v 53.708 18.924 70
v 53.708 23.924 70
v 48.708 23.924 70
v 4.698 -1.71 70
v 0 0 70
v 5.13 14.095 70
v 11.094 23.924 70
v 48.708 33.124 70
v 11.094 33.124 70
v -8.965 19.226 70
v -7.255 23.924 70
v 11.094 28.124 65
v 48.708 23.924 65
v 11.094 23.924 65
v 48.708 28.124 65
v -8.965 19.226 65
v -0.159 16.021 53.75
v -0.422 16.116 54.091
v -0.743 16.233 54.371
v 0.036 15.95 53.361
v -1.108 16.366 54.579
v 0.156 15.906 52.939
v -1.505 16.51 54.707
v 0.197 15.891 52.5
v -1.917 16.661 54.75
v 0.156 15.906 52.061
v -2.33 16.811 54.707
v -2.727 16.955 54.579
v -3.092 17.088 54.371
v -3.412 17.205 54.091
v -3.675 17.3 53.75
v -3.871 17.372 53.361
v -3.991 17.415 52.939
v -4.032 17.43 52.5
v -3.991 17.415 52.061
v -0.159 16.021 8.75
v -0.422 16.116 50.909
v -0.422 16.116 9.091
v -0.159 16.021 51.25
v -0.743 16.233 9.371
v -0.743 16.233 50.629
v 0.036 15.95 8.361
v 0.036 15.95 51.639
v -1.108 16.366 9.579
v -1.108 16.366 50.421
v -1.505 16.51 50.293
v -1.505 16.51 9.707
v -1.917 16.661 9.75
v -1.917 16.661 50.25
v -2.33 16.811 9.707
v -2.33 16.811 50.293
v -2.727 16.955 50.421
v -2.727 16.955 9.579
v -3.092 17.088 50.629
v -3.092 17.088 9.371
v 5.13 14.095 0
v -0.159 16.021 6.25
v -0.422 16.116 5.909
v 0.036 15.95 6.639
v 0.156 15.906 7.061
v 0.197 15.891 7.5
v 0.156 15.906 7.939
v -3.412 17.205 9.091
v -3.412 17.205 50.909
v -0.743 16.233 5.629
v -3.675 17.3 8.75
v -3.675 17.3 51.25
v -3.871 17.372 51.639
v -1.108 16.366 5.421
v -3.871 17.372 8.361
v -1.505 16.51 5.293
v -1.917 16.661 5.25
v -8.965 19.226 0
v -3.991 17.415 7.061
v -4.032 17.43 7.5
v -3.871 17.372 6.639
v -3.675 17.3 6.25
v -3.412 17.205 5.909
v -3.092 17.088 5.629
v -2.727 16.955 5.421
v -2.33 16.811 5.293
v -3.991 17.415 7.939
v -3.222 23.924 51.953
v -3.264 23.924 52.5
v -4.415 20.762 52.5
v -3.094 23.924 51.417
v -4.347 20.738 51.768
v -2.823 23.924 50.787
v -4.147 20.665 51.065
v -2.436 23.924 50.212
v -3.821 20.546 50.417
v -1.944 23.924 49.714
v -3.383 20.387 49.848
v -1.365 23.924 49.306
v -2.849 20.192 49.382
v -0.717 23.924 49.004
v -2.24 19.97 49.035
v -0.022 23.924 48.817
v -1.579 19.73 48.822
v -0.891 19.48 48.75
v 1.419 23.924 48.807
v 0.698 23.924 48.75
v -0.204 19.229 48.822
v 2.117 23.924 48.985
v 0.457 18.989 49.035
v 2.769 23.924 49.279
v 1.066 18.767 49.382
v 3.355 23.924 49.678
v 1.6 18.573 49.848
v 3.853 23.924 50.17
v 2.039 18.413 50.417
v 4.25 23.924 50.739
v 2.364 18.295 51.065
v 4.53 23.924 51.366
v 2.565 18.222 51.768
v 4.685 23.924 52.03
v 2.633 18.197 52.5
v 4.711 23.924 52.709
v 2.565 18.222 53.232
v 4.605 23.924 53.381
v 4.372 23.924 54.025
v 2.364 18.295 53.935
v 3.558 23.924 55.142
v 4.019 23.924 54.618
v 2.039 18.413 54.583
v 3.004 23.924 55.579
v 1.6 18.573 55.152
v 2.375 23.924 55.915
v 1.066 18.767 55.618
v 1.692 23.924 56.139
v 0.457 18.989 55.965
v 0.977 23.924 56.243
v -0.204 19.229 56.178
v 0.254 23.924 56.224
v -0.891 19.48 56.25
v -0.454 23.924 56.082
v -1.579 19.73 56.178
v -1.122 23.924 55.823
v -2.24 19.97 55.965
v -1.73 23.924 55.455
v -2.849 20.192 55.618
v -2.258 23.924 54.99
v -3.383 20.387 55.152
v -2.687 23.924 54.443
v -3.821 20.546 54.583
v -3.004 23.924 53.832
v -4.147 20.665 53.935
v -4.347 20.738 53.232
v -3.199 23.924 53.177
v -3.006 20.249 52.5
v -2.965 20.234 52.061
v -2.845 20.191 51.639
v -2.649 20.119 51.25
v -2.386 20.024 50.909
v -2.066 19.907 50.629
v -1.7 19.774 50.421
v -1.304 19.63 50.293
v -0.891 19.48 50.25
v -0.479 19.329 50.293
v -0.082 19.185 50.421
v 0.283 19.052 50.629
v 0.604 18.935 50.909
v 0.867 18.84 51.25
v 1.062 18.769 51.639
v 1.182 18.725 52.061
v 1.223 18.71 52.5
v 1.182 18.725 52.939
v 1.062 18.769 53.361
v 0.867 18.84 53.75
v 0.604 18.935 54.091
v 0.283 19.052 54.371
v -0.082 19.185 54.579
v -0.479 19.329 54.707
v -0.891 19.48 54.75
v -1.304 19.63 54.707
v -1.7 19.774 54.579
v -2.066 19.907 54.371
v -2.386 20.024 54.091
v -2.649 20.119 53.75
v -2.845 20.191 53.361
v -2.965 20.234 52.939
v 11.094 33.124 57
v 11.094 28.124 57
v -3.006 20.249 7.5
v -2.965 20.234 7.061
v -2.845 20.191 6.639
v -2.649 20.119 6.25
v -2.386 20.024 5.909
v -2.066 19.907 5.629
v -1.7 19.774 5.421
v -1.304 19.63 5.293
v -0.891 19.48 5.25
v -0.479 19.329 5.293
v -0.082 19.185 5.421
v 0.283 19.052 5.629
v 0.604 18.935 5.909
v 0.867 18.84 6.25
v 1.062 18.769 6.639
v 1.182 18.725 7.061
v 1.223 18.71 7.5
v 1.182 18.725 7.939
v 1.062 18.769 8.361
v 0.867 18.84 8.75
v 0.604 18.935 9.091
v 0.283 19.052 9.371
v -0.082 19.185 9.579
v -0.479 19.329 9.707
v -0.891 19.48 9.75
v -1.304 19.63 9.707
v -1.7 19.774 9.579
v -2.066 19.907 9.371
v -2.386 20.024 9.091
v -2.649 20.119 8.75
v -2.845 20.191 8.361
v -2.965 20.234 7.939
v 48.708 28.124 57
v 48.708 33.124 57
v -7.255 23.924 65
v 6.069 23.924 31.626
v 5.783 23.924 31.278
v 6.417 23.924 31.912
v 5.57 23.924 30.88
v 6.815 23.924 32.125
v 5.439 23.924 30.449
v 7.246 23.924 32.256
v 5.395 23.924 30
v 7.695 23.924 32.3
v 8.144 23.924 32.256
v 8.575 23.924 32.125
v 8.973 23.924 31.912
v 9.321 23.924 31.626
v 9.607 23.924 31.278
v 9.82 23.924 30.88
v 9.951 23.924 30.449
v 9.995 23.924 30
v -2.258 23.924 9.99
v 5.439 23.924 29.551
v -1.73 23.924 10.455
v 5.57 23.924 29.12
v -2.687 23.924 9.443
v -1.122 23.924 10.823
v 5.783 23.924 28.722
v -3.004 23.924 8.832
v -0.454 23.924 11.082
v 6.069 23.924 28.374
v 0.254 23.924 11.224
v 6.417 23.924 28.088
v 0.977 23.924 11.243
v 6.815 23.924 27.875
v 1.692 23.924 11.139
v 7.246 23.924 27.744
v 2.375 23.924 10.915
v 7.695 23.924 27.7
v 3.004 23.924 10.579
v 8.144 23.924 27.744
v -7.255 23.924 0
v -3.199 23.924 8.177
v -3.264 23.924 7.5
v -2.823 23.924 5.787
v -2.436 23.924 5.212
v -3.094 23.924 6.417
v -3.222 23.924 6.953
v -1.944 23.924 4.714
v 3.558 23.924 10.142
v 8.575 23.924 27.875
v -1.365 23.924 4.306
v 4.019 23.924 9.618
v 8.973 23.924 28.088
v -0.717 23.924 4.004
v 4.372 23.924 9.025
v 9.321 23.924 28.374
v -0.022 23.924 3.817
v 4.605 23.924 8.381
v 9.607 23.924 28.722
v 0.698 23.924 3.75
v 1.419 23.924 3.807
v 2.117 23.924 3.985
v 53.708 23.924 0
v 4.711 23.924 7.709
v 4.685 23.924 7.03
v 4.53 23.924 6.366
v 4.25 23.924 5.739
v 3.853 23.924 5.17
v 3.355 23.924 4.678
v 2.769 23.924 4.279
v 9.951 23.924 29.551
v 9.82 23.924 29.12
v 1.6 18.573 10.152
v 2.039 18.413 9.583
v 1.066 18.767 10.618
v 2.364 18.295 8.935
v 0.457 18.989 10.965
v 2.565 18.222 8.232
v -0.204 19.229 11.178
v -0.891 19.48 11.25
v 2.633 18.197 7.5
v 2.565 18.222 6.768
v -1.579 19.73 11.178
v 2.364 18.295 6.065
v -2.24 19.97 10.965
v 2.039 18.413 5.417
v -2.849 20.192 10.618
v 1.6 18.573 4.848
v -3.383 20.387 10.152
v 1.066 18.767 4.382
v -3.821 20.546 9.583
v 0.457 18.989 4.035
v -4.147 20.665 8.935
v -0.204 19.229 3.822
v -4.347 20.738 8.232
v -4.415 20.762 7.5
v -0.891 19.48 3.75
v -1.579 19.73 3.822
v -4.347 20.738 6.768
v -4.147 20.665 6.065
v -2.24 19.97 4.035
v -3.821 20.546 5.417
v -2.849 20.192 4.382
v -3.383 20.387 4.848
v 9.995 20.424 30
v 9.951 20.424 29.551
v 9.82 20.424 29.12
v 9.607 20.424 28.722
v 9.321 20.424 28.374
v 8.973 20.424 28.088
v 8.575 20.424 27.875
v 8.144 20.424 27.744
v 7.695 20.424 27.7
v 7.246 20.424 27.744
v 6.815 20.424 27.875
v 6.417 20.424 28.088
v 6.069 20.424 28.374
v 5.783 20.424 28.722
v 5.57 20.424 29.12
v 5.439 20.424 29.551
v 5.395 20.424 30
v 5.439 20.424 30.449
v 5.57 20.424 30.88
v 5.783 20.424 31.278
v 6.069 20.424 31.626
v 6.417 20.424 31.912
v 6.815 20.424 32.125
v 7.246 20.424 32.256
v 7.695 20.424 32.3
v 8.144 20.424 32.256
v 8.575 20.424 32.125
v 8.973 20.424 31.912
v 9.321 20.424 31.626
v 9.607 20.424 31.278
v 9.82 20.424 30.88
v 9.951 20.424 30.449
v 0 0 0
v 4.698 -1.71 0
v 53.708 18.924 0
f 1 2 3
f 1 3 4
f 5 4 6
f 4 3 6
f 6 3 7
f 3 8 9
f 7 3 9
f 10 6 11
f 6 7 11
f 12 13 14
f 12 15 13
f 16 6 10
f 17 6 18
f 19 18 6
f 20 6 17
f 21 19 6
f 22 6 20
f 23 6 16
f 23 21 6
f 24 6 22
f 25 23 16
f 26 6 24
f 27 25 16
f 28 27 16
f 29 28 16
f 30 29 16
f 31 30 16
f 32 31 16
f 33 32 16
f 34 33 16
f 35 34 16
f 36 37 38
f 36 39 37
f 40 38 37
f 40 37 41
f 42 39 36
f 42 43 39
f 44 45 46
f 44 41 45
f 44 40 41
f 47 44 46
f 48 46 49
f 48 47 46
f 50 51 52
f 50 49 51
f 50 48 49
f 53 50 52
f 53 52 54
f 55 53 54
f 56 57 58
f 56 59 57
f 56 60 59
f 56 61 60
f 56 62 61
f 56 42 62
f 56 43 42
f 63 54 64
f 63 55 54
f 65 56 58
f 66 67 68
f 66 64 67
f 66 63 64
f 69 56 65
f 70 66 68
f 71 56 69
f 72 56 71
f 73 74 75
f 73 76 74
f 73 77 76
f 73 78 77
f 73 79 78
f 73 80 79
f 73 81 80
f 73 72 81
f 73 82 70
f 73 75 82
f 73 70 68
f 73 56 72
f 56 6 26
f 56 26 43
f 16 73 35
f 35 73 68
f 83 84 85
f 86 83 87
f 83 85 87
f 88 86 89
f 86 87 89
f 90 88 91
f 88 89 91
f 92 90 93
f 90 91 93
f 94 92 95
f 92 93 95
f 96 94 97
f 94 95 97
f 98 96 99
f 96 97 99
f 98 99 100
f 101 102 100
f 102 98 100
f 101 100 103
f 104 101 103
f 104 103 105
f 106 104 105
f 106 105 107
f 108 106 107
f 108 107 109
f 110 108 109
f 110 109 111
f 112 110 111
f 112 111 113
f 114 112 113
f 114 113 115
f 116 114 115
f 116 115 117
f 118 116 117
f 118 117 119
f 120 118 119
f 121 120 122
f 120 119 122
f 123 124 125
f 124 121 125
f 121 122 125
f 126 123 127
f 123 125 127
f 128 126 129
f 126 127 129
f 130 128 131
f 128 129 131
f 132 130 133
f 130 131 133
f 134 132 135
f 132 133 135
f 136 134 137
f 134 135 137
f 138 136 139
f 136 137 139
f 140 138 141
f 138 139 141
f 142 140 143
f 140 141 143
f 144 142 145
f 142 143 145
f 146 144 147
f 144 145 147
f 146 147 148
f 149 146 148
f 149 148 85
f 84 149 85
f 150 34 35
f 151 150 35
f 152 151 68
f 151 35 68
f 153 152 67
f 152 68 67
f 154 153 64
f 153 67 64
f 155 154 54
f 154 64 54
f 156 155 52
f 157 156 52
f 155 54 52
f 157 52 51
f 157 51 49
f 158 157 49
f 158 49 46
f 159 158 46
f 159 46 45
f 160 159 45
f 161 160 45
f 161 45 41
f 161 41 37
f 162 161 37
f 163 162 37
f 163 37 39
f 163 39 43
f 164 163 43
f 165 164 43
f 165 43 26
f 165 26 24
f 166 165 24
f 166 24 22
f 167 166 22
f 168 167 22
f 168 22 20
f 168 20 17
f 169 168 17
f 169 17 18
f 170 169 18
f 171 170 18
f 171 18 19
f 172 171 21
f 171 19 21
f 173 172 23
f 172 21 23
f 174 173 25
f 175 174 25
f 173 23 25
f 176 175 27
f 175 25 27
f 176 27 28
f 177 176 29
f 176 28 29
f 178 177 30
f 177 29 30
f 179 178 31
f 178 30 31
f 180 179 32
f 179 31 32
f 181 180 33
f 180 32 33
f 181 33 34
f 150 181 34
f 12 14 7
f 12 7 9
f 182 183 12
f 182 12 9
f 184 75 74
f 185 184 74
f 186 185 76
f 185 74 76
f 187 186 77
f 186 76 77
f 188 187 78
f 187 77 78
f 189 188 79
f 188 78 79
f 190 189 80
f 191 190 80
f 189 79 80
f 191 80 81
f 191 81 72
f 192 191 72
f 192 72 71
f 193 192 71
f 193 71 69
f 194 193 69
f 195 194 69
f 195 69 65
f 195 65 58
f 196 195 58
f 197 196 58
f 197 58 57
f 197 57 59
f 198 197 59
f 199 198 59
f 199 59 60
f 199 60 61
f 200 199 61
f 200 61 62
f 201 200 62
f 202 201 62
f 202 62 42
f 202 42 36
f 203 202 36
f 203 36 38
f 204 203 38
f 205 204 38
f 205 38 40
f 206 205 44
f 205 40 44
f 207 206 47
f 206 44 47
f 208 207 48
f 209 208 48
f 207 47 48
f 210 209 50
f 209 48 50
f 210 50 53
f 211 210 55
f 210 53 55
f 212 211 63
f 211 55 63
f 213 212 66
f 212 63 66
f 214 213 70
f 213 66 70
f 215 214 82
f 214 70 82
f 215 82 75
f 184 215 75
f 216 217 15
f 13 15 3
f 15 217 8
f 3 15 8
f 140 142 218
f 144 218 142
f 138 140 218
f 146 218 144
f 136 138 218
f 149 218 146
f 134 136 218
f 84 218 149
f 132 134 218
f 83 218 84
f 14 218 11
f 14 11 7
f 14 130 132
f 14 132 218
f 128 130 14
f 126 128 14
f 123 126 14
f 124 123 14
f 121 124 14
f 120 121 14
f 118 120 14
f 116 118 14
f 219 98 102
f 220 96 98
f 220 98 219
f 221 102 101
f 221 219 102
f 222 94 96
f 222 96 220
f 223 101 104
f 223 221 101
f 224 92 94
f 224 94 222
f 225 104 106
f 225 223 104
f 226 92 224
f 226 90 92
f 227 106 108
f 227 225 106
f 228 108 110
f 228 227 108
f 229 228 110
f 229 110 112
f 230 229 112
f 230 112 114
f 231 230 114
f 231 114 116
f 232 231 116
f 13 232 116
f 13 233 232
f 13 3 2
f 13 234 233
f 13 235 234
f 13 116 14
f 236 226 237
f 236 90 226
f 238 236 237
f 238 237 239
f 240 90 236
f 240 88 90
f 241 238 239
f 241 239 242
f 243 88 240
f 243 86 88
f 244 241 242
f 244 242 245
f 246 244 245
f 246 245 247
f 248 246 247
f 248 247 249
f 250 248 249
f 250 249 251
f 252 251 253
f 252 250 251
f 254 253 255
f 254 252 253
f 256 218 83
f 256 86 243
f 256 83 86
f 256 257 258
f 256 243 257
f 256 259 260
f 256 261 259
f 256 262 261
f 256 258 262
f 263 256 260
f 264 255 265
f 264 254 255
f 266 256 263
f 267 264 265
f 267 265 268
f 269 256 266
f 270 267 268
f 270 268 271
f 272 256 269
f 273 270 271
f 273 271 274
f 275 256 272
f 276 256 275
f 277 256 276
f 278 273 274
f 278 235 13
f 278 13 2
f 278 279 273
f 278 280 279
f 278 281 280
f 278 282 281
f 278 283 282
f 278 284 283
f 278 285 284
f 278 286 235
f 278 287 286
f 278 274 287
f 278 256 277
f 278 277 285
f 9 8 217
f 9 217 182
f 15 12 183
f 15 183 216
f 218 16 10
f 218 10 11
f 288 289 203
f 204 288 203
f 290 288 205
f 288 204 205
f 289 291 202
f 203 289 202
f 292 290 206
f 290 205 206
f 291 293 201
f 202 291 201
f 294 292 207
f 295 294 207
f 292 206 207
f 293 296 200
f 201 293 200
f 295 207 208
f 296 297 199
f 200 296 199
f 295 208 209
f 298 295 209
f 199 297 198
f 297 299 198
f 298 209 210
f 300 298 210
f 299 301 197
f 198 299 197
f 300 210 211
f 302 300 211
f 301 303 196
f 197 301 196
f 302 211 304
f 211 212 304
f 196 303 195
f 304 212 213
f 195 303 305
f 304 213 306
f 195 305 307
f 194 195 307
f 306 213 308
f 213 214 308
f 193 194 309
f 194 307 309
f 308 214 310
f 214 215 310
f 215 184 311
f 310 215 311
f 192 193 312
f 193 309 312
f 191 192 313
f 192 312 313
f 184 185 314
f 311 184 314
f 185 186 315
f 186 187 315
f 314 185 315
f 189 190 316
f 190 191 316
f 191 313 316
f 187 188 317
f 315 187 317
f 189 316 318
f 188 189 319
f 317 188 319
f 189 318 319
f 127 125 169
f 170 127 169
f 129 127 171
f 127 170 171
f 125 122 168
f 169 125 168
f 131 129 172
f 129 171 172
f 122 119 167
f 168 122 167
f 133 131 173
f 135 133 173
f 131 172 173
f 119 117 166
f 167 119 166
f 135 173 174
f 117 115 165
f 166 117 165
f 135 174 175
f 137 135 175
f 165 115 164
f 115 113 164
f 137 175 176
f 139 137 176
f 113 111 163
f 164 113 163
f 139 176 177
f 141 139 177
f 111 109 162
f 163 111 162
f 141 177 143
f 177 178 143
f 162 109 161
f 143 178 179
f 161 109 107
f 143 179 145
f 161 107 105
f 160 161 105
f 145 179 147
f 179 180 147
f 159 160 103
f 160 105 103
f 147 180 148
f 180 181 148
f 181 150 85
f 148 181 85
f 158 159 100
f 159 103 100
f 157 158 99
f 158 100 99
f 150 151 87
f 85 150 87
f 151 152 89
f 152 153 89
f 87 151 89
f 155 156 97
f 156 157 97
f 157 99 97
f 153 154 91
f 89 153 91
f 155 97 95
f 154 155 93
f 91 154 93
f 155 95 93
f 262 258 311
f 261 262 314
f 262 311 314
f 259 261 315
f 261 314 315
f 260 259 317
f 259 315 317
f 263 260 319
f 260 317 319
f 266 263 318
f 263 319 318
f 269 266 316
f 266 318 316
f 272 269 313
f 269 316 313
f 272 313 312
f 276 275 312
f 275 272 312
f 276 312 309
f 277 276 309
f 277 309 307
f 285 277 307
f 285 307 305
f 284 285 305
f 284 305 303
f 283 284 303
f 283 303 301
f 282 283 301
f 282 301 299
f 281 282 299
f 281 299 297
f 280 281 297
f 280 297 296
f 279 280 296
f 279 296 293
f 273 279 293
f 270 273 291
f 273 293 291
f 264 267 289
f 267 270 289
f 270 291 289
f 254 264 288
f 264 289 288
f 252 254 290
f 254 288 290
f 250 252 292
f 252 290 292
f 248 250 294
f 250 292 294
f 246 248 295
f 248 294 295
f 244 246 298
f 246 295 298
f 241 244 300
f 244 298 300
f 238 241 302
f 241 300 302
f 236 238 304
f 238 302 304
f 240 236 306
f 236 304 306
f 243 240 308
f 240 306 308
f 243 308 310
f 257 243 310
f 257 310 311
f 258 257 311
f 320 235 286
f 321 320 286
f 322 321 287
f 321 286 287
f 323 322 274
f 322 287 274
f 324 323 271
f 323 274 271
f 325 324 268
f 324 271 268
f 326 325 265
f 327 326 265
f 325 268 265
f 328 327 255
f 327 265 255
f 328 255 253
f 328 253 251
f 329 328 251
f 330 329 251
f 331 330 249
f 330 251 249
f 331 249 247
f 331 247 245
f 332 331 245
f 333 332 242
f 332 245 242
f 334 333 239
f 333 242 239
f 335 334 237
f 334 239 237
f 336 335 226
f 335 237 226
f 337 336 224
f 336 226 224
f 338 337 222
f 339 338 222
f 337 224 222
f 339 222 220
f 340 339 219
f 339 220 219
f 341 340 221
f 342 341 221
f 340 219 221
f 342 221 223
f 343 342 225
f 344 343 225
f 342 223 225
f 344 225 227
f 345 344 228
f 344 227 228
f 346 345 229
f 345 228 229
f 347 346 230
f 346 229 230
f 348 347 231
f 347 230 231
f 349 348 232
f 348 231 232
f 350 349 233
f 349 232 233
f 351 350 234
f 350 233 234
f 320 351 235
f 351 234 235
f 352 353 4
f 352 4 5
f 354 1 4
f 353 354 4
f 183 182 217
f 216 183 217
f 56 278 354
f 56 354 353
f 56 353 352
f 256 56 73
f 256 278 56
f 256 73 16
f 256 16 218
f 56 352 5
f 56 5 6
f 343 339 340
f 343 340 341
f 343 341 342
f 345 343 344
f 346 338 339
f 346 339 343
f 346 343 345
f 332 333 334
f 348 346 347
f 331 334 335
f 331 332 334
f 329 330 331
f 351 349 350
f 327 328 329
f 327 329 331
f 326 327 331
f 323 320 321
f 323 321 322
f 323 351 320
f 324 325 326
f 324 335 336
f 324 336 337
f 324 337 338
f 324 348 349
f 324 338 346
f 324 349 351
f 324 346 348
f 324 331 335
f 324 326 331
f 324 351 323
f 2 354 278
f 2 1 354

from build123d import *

# Parameters (mm, degrees)
EXTRUDE_1_DEPTH     = 65
SKETCH_4_R          = 2.25
CUT_EXTRUDE_2_DEPTH = 44
CUT_EXTRUDE_START   = -3
SKETCH_5_R          = 3.75
CUT_EXTRUDE_3_DEPTH = 44
EXTRUDE_2_DEPTH     = 5
EXTRUDE_3_DEPTH     = 8
SKETCH_8_R          = 2.3
CUT_EXTRUDE_4_DEPTH = 3.5
CUT_EXTRUDE_6_DEPTH = 14
CUT_EXTRUDE_7_DEPTH = 5


with BuildPart() as part:
    # ｽｹｯﾁ1 → ﾎﾞｽ - 押し出し1 (new body)
    with BuildSketch(Plane.XY):
        Polygon((0, 0), (5.13030215, 14.095389312), (-8.965087162, 19.225691462), (-7.254986445, 23.924154566), (53.707680142, 23.924154566), (53.707680142, 18.924154566), (4.698463104, -1.710100717), align=None)
    extrude(amount=EXTRUDE_1_DEPTH)

    # ｽｹｯﾁ4 → ｶｯﾄ - 押し出し2 (cut)
    with BuildSketch(Plane(origin=(5.13030215, 14.095389312, 0), x_dir=(-0.939692621, 0.342020143, 0), z_dir=(-0.342020143, -0.939692621, 0))):
        with Locations((7.5, -7.5)):
            Circle(SKETCH_4_R)
        with Locations((7.5, -52.5)):
            Circle(SKETCH_4_R)
    extrude(amount=-CUT_EXTRUDE_2_DEPTH, mode=Mode.SUBTRACT)

    # ｽｹｯﾁ5 → ｶｯﾄ - 押し出し3 (cut)
    with BuildSketch(Plane(origin=(5.13030215, 14.095389312, 0), x_dir=(-0.939692621, 0.342020143, 0), z_dir=(-0.342020143, -0.939692621, 0)).offset(CUT_EXTRUDE_START)):
        with Locations((7.5, -52.5)):
            Circle(SKETCH_5_R)
        with Locations((7.5, -7.5)):
            Circle(SKETCH_5_R)
    extrude(amount=-CUT_EXTRUDE_3_DEPTH, mode=Mode.SUBTRACT)

    # ｽｹｯﾁ6 → ﾎﾞｽ - 押し出し2 (add)
    with BuildSketch(Plane(origin=(0, 0, 65), x_dir=(-1, 0, 0), z_dir=(0, 0, -1))):
        Polygon((-53.707680142, 33.124154566), (-53.707680142, 18.924154566), (-4.698463104, -1.710100717), (0, 0), (-5.13030215, 14.095389312), (8.965087162, 19.225691462), (3.90646029, 33.124154566), align=None)
    extrude(amount=-EXTRUDE_2_DEPTH)

    # ｽｹｯﾁ7 → ﾎﾞｽ - 押し出し3 (add)
    with BuildSketch(Plane(origin=(0, 0, 65), x_dir=(-1, 0, 0), z_dir=(0, 0, -1))):
        Polygon((3.90646029, 33.124154566), (5.726311461, 28.124154566), (-53.707680142, 28.124154566), (-53.707680142, 33.124154566), align=None)
    extrude(amount=EXTRUDE_3_DEPTH)

    # ｽｹｯﾁ8 → ｶｯﾄ - 押し出し4 (cut)
    with BuildSketch(Plane(origin=(0, 23.924154566, 0), x_dir=(1, 0, 0), z_dir=(0, 1, 0))):
        with Locations((7.695013555, -30)):
            Circle(SKETCH_8_R)
    extrude(amount=-CUT_EXTRUDE_4_DEPTH, mode=Mode.SUBTRACT)

    # ｽｹｯﾁ10 → ｶｯﾄ - 押し出し6 (cut, through all)
    with BuildSketch(Plane(origin=(0, 0, 57), x_dir=(-1, 0, 0), z_dir=(0, 0, -1))):
        Polygon((7.254986445, 23.924154566), (-11.09353971, 23.924154566), (-11.09353971, 33.124154566), (3.90646029, 33.124154566), align=None)
    extrude(amount=-CUT_EXTRUDE_6_DEPTH, mode=Mode.SUBTRACT)

    # ｽｹｯﾁ11 → ｶｯﾄ - 押し出し7 (cut)
    with BuildSketch(Plane(origin=(53.707680142, 0, 0), x_dir=(0, 0, -1), z_dir=(1, 0, 0))):
        Polygon((-65, 23.924154566), (-70, 23.924154566), (-70, 33.124154566), (-57, 33.124154566), (-57, 28.124154566), (-65, 28.124154566), align=None)
    extrude(amount=-CUT_EXTRUDE_7_DEPTH, mode=Mode.SUBTRACT)


solid = part.part
